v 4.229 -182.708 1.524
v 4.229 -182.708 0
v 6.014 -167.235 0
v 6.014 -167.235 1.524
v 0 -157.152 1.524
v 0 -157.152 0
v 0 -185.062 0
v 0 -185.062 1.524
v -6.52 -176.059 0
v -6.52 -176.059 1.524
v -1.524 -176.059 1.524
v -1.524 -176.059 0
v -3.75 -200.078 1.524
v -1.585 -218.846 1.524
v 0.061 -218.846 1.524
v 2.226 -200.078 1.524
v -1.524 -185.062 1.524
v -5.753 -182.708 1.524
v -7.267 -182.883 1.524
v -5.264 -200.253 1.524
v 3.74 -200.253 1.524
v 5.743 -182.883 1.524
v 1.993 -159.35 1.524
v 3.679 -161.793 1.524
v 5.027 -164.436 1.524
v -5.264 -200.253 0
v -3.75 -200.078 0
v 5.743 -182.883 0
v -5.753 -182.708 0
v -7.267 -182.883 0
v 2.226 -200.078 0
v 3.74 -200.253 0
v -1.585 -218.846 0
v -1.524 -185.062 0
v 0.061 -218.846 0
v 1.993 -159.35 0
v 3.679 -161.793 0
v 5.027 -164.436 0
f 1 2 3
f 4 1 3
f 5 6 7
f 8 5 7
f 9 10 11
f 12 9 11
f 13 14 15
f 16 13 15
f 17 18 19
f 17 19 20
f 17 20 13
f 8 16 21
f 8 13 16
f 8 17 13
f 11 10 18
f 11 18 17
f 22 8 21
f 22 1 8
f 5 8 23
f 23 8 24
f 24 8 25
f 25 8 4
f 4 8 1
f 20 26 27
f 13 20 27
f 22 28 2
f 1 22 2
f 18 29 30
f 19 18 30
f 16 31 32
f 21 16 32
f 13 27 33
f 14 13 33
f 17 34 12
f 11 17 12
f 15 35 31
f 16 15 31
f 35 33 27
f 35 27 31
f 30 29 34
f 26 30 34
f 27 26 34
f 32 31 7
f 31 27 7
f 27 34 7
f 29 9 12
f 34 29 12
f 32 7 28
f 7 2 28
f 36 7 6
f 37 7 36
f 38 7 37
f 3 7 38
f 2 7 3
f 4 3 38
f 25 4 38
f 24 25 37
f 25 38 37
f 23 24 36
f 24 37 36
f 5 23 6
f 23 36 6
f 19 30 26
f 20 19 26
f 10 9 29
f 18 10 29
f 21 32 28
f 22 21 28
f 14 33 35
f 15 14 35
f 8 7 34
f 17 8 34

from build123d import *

# Parameters (mm, degrees)
BOSS_EXTRUDE1_DEPTH = 1.524
SKETCH2_W           = 10.339952981
SKETCH2_H           = 21.008044078
CUT_EXTRUDE1_DEPTH  = 1.524


with BuildPart() as part:
    # Sketch1 → Boss-Extrude1 (new body)
    with BuildSketch(Plane.XY):
        with BuildLine():
            Line((0, -185.062075144), (-1.524, -185.062075144))
            Line((-1.524, -185.062075144), (-1.524, -157.15233073))
            ThreePointArc((-1.524, -157.15233073), (-5.202982181, -161.792523258), (-7.537553978, -167.234588225))
            Line((-7.537553978, -167.234588225), (-5.752935589, -182.708365208))
            Line((-5.752935589, -182.708365208), (-7.266899912, -182.882973423))
            Line((-7.266899912, -182.882973423), (-5.263633807, -200.252565221))
            Line((-5.263633807, -200.252565221), (-3.749669484, -200.077957006))
            Line((-3.749669484, -200.077957006), (-1.585117021, -218.846004156))
            Line((-1.585117021, -218.846004156), (0.061117021, -218.846004156))
            Line((0.061117021, -218.846004156), (2.225669484, -200.077957006))
            Line((2.225669484, -200.077957006), (3.739633807, -200.252565221))
            Line((3.739633807, -200.252565221), (5.742899912, -182.882973423))
            Line((5.742899912, -182.882973423), (4.228935589, -182.708365208))
            Line((4.228935589, -182.708365208), (6.013553978, -167.234588225))
            ThreePointArc((6.013553978, -167.234588225), (3.678982181, -161.792523258), (0, -157.15233073))
            Line((0, -157.15233073), (0, -185.062075144))
        make_face()
    extrude(amount=BOSS_EXTRUDE1_DEPTH)

    # Sketch2 → Cut-Extrude1 (cut)
    with BuildSketch(Plane.XY.offset(1.524)):
        with Locations((-6.693976491, -165.555147297)):
            Rectangle(SKETCH2_W, SKETCH2_H)
    extrude(amount=-CUT_EXTRUDE1_DEPTH, mode=Mode.SUBTRACT)


solid = part.part
